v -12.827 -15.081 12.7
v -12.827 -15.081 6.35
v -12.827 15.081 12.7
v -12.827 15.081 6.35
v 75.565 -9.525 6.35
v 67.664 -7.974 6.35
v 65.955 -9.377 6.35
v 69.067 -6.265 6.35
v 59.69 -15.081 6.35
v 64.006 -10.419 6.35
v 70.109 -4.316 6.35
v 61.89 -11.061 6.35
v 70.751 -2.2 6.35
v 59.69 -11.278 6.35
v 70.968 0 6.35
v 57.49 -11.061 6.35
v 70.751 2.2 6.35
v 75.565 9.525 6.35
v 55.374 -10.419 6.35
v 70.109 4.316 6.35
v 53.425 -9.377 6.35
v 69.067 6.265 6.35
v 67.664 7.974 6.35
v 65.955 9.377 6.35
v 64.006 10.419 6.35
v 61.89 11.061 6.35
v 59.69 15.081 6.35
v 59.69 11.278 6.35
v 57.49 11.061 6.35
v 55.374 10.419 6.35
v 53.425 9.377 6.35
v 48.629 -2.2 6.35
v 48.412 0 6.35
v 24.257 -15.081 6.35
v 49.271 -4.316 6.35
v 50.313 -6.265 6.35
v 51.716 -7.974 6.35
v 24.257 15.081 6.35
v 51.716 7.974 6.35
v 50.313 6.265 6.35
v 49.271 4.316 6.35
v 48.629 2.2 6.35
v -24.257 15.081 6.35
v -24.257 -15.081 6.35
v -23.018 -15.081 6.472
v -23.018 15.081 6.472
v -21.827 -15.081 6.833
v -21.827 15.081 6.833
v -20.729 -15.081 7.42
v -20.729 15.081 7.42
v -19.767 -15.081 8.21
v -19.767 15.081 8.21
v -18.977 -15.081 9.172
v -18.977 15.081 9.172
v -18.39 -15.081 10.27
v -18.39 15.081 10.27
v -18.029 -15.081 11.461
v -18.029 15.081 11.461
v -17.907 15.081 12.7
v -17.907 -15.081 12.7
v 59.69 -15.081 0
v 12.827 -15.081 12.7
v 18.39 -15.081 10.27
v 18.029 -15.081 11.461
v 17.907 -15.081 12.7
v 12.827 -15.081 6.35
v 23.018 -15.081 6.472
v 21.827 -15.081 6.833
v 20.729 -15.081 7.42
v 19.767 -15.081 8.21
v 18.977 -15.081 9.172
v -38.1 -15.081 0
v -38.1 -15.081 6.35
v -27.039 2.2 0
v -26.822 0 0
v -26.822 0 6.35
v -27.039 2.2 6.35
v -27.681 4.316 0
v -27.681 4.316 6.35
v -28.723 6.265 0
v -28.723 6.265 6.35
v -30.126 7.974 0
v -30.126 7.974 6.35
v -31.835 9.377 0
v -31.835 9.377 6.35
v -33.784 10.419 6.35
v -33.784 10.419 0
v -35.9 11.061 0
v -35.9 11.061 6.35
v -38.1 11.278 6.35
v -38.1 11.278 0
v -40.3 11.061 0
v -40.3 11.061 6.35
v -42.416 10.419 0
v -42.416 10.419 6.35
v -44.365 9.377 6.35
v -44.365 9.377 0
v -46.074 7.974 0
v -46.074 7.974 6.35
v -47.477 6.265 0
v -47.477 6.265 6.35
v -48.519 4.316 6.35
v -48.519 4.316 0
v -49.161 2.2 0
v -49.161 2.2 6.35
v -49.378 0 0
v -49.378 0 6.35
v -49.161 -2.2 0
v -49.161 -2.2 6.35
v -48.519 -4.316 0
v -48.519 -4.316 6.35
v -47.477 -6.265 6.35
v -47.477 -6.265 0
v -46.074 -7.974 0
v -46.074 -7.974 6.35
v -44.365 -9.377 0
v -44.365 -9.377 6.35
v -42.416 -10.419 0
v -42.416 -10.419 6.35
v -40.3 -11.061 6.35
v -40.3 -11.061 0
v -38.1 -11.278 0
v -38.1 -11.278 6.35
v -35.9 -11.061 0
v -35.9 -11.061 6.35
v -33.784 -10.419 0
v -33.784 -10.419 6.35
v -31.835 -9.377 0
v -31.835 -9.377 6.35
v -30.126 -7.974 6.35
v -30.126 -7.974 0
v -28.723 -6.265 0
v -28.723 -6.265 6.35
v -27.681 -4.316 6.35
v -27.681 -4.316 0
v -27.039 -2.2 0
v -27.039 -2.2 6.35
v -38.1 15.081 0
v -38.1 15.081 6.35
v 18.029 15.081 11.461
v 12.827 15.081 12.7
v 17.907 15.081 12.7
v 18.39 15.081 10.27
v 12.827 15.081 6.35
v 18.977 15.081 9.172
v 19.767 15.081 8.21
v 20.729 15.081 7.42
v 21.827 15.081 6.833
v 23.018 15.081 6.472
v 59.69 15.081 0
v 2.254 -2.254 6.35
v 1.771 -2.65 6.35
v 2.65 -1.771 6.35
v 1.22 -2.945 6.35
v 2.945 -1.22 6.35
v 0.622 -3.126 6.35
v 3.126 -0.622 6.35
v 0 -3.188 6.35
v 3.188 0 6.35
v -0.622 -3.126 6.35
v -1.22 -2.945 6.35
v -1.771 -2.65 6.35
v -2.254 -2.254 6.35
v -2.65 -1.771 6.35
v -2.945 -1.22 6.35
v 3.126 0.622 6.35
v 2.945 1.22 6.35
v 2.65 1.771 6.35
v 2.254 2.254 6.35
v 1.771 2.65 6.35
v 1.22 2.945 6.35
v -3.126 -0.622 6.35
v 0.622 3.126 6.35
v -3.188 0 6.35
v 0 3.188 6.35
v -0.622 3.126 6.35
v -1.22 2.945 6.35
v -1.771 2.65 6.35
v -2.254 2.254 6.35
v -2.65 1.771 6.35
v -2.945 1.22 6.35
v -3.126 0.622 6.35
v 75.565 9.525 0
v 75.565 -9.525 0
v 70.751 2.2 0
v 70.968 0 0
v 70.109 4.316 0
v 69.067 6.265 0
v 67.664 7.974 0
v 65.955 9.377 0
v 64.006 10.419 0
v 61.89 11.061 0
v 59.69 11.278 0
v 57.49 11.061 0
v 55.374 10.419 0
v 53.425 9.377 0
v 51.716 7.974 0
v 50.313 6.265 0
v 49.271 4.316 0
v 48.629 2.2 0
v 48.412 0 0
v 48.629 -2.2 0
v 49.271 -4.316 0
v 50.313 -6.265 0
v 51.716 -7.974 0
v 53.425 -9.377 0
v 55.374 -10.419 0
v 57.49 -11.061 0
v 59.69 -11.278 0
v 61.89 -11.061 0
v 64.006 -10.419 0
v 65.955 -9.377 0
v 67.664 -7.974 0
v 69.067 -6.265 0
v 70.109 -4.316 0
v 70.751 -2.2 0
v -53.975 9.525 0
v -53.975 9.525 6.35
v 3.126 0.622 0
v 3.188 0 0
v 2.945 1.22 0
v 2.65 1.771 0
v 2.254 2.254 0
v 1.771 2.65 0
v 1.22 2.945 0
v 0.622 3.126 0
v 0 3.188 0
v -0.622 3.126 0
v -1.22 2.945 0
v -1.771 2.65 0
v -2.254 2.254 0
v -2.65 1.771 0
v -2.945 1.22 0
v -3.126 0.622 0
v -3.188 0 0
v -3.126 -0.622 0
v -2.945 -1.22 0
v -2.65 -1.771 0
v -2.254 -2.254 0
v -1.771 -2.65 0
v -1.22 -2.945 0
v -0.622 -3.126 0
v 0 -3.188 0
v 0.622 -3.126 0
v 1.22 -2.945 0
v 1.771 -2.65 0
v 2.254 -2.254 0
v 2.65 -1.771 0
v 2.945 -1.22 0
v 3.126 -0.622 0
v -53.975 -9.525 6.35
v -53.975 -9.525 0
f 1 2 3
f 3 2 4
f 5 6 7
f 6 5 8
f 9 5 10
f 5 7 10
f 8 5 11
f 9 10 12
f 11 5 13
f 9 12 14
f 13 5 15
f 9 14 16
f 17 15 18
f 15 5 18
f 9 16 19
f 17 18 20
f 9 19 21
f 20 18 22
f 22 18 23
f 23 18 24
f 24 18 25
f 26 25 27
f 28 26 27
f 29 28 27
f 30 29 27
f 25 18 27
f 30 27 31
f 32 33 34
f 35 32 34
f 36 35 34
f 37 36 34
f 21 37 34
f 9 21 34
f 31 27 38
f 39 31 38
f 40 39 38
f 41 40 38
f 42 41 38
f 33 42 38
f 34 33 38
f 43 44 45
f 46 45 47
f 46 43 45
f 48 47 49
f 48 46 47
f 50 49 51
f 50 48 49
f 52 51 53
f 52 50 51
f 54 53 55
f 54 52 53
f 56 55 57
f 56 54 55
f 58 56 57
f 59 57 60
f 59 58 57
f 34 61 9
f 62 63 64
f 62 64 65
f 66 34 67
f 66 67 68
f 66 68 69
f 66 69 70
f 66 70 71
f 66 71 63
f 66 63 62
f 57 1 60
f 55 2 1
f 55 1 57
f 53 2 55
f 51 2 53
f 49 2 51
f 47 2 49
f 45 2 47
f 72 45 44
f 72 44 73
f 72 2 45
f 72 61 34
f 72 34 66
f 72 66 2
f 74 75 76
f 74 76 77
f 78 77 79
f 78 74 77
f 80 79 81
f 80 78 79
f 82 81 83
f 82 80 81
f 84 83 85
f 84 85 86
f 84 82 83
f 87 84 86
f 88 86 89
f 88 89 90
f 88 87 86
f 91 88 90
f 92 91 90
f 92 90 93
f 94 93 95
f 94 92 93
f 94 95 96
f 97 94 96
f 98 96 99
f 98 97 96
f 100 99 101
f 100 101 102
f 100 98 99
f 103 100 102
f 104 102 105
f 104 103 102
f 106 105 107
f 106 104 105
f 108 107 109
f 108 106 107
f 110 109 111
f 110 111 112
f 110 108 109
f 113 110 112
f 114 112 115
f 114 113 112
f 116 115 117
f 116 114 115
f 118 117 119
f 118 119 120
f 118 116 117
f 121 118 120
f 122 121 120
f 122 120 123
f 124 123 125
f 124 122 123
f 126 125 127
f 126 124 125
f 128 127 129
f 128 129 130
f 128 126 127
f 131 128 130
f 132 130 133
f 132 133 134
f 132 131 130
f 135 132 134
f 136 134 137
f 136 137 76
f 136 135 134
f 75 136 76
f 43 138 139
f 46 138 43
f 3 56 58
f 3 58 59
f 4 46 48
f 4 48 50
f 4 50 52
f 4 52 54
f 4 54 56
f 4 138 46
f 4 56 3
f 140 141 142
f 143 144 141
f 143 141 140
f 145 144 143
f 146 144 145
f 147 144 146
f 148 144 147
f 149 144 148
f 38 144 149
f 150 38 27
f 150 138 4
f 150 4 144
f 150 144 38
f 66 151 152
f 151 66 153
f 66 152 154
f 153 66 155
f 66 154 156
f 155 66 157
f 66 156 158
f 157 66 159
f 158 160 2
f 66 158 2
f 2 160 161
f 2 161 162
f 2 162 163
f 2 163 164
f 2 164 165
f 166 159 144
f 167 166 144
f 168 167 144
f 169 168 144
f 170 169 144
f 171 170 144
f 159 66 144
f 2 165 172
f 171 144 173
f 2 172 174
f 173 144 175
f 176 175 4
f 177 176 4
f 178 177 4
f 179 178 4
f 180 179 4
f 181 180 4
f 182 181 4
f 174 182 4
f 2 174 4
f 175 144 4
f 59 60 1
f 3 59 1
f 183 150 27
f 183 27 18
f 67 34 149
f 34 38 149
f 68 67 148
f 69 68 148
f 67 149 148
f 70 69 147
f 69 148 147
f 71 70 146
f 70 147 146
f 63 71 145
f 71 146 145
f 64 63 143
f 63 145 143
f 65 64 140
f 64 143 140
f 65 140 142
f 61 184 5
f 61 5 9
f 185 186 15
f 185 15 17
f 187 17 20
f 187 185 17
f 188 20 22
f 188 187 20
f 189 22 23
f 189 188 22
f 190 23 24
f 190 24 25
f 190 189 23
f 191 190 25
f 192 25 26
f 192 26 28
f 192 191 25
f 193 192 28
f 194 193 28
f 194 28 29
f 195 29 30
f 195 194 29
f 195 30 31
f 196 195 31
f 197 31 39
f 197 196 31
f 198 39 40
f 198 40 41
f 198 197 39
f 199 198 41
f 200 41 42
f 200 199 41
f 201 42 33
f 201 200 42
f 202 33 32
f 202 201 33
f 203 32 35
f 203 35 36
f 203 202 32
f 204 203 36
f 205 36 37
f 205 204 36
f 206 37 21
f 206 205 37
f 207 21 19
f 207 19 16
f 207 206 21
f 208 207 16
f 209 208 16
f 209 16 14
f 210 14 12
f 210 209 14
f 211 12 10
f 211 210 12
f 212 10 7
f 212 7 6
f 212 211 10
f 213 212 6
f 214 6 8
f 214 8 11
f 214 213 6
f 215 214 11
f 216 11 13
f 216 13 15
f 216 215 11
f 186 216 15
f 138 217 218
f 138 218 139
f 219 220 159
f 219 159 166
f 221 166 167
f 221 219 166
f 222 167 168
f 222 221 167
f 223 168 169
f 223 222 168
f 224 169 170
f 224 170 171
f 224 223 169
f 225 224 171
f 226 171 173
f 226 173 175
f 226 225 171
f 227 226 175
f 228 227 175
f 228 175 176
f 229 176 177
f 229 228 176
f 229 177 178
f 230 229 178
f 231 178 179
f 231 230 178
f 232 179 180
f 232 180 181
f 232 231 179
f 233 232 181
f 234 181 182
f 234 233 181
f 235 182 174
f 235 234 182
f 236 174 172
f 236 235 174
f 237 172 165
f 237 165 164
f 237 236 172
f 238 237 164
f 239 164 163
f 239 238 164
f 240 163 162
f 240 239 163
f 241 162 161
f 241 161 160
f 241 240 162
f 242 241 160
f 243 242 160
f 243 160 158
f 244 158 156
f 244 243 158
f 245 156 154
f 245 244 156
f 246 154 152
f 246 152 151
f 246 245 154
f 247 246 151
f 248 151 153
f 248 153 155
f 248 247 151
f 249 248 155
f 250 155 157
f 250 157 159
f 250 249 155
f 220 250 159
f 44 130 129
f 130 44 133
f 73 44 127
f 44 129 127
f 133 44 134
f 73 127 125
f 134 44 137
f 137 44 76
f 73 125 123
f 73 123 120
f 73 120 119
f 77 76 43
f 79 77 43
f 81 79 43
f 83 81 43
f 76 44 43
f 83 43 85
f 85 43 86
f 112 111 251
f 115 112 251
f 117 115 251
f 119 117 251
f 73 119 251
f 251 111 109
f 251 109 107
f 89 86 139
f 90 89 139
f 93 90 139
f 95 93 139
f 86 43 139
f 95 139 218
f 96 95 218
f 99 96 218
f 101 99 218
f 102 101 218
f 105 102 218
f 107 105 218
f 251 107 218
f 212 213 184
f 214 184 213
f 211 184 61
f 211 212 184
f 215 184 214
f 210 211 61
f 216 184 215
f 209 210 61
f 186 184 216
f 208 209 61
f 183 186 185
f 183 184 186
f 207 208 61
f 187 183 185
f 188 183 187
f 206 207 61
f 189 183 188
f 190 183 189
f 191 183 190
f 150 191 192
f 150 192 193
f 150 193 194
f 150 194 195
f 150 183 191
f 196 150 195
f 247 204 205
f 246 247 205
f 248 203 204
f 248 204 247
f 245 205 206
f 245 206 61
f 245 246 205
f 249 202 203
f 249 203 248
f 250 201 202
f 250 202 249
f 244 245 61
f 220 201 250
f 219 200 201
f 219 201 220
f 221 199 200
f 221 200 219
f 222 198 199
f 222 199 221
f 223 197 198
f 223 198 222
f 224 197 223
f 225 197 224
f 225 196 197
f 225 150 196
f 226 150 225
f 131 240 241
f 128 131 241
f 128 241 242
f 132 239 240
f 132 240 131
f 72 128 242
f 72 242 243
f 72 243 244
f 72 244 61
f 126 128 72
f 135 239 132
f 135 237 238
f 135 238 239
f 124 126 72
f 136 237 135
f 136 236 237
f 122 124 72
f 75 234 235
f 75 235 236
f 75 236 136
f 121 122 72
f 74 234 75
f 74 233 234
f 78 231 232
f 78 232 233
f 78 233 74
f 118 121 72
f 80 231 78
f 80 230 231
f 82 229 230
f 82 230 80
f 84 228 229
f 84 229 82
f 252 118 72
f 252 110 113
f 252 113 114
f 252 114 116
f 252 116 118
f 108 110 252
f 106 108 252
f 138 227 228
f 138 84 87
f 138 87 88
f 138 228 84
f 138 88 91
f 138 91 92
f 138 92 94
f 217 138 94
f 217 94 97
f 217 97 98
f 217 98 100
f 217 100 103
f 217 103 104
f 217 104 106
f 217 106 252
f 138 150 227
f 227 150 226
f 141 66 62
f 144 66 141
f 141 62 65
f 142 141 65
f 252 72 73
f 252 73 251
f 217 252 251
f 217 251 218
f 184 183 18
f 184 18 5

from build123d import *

# Parameters (mm, degrees)
SKETCH1_R           = 3.1877
SKETCH1_R_2         = 11.2776
BOSS_EXTRUDE1_DEPTH = 6.35
SKETCH2_W           = 5.08
SKETCH2_H           = 30.1625
BOSS_EXTRUDE2_DEPTH = 6.35
FILLET1_R           = 6.35


with BuildPart() as part:
    # Sketch1 → Boss-Extrude1 (new body)
    with BuildSketch(Plane.XY):
        Polygon((-38.1, 15.08125), (59.69, 15.08125), (75.565, 9.525), (75.565, -9.525), (59.69, -15.08125), (-38.1, -15.08125), (-53.975, -9.525), (-53.975, 9.525), align=None)
        Circle(SKETCH1_R, mode=Mode.SUBTRACT)
        with Locations((-38.1, 0)):
            Circle(SKETCH1_R_2, mode=Mode.SUBTRACT)
        with Locations((59.69, 0)):
            Circle(SKETCH1_R_2, mode=Mode.SUBTRACT)
    extrude(amount=BOSS_EXTRUDE1_DEPTH)

    # Sketch2 → Boss-Extrude2 (add)
    with BuildSketch(Plane.XY.offset(6.35)):
        with Locations((-15.367, 0)):
            Rectangle(SKETCH2_W, SKETCH2_H)
        with Locations((15.367, 0)):
            Rectangle(SKETCH2_W, SKETCH2_H)
    extrude(amount=BOSS_EXTRUDE2_DEPTH)

    # Fillet1
    fillet1_edges = [part.edges().sort_by_distance(p)[0] for p in [
        (-17.907, 0, 6.35),
        (17.907, 0, 6.35),
    ]]
    fillet(fillet1_edges, radius=FILLET1_R - 0.0001)  # a hair under: the kernel refuses the full size


solid = part.part
